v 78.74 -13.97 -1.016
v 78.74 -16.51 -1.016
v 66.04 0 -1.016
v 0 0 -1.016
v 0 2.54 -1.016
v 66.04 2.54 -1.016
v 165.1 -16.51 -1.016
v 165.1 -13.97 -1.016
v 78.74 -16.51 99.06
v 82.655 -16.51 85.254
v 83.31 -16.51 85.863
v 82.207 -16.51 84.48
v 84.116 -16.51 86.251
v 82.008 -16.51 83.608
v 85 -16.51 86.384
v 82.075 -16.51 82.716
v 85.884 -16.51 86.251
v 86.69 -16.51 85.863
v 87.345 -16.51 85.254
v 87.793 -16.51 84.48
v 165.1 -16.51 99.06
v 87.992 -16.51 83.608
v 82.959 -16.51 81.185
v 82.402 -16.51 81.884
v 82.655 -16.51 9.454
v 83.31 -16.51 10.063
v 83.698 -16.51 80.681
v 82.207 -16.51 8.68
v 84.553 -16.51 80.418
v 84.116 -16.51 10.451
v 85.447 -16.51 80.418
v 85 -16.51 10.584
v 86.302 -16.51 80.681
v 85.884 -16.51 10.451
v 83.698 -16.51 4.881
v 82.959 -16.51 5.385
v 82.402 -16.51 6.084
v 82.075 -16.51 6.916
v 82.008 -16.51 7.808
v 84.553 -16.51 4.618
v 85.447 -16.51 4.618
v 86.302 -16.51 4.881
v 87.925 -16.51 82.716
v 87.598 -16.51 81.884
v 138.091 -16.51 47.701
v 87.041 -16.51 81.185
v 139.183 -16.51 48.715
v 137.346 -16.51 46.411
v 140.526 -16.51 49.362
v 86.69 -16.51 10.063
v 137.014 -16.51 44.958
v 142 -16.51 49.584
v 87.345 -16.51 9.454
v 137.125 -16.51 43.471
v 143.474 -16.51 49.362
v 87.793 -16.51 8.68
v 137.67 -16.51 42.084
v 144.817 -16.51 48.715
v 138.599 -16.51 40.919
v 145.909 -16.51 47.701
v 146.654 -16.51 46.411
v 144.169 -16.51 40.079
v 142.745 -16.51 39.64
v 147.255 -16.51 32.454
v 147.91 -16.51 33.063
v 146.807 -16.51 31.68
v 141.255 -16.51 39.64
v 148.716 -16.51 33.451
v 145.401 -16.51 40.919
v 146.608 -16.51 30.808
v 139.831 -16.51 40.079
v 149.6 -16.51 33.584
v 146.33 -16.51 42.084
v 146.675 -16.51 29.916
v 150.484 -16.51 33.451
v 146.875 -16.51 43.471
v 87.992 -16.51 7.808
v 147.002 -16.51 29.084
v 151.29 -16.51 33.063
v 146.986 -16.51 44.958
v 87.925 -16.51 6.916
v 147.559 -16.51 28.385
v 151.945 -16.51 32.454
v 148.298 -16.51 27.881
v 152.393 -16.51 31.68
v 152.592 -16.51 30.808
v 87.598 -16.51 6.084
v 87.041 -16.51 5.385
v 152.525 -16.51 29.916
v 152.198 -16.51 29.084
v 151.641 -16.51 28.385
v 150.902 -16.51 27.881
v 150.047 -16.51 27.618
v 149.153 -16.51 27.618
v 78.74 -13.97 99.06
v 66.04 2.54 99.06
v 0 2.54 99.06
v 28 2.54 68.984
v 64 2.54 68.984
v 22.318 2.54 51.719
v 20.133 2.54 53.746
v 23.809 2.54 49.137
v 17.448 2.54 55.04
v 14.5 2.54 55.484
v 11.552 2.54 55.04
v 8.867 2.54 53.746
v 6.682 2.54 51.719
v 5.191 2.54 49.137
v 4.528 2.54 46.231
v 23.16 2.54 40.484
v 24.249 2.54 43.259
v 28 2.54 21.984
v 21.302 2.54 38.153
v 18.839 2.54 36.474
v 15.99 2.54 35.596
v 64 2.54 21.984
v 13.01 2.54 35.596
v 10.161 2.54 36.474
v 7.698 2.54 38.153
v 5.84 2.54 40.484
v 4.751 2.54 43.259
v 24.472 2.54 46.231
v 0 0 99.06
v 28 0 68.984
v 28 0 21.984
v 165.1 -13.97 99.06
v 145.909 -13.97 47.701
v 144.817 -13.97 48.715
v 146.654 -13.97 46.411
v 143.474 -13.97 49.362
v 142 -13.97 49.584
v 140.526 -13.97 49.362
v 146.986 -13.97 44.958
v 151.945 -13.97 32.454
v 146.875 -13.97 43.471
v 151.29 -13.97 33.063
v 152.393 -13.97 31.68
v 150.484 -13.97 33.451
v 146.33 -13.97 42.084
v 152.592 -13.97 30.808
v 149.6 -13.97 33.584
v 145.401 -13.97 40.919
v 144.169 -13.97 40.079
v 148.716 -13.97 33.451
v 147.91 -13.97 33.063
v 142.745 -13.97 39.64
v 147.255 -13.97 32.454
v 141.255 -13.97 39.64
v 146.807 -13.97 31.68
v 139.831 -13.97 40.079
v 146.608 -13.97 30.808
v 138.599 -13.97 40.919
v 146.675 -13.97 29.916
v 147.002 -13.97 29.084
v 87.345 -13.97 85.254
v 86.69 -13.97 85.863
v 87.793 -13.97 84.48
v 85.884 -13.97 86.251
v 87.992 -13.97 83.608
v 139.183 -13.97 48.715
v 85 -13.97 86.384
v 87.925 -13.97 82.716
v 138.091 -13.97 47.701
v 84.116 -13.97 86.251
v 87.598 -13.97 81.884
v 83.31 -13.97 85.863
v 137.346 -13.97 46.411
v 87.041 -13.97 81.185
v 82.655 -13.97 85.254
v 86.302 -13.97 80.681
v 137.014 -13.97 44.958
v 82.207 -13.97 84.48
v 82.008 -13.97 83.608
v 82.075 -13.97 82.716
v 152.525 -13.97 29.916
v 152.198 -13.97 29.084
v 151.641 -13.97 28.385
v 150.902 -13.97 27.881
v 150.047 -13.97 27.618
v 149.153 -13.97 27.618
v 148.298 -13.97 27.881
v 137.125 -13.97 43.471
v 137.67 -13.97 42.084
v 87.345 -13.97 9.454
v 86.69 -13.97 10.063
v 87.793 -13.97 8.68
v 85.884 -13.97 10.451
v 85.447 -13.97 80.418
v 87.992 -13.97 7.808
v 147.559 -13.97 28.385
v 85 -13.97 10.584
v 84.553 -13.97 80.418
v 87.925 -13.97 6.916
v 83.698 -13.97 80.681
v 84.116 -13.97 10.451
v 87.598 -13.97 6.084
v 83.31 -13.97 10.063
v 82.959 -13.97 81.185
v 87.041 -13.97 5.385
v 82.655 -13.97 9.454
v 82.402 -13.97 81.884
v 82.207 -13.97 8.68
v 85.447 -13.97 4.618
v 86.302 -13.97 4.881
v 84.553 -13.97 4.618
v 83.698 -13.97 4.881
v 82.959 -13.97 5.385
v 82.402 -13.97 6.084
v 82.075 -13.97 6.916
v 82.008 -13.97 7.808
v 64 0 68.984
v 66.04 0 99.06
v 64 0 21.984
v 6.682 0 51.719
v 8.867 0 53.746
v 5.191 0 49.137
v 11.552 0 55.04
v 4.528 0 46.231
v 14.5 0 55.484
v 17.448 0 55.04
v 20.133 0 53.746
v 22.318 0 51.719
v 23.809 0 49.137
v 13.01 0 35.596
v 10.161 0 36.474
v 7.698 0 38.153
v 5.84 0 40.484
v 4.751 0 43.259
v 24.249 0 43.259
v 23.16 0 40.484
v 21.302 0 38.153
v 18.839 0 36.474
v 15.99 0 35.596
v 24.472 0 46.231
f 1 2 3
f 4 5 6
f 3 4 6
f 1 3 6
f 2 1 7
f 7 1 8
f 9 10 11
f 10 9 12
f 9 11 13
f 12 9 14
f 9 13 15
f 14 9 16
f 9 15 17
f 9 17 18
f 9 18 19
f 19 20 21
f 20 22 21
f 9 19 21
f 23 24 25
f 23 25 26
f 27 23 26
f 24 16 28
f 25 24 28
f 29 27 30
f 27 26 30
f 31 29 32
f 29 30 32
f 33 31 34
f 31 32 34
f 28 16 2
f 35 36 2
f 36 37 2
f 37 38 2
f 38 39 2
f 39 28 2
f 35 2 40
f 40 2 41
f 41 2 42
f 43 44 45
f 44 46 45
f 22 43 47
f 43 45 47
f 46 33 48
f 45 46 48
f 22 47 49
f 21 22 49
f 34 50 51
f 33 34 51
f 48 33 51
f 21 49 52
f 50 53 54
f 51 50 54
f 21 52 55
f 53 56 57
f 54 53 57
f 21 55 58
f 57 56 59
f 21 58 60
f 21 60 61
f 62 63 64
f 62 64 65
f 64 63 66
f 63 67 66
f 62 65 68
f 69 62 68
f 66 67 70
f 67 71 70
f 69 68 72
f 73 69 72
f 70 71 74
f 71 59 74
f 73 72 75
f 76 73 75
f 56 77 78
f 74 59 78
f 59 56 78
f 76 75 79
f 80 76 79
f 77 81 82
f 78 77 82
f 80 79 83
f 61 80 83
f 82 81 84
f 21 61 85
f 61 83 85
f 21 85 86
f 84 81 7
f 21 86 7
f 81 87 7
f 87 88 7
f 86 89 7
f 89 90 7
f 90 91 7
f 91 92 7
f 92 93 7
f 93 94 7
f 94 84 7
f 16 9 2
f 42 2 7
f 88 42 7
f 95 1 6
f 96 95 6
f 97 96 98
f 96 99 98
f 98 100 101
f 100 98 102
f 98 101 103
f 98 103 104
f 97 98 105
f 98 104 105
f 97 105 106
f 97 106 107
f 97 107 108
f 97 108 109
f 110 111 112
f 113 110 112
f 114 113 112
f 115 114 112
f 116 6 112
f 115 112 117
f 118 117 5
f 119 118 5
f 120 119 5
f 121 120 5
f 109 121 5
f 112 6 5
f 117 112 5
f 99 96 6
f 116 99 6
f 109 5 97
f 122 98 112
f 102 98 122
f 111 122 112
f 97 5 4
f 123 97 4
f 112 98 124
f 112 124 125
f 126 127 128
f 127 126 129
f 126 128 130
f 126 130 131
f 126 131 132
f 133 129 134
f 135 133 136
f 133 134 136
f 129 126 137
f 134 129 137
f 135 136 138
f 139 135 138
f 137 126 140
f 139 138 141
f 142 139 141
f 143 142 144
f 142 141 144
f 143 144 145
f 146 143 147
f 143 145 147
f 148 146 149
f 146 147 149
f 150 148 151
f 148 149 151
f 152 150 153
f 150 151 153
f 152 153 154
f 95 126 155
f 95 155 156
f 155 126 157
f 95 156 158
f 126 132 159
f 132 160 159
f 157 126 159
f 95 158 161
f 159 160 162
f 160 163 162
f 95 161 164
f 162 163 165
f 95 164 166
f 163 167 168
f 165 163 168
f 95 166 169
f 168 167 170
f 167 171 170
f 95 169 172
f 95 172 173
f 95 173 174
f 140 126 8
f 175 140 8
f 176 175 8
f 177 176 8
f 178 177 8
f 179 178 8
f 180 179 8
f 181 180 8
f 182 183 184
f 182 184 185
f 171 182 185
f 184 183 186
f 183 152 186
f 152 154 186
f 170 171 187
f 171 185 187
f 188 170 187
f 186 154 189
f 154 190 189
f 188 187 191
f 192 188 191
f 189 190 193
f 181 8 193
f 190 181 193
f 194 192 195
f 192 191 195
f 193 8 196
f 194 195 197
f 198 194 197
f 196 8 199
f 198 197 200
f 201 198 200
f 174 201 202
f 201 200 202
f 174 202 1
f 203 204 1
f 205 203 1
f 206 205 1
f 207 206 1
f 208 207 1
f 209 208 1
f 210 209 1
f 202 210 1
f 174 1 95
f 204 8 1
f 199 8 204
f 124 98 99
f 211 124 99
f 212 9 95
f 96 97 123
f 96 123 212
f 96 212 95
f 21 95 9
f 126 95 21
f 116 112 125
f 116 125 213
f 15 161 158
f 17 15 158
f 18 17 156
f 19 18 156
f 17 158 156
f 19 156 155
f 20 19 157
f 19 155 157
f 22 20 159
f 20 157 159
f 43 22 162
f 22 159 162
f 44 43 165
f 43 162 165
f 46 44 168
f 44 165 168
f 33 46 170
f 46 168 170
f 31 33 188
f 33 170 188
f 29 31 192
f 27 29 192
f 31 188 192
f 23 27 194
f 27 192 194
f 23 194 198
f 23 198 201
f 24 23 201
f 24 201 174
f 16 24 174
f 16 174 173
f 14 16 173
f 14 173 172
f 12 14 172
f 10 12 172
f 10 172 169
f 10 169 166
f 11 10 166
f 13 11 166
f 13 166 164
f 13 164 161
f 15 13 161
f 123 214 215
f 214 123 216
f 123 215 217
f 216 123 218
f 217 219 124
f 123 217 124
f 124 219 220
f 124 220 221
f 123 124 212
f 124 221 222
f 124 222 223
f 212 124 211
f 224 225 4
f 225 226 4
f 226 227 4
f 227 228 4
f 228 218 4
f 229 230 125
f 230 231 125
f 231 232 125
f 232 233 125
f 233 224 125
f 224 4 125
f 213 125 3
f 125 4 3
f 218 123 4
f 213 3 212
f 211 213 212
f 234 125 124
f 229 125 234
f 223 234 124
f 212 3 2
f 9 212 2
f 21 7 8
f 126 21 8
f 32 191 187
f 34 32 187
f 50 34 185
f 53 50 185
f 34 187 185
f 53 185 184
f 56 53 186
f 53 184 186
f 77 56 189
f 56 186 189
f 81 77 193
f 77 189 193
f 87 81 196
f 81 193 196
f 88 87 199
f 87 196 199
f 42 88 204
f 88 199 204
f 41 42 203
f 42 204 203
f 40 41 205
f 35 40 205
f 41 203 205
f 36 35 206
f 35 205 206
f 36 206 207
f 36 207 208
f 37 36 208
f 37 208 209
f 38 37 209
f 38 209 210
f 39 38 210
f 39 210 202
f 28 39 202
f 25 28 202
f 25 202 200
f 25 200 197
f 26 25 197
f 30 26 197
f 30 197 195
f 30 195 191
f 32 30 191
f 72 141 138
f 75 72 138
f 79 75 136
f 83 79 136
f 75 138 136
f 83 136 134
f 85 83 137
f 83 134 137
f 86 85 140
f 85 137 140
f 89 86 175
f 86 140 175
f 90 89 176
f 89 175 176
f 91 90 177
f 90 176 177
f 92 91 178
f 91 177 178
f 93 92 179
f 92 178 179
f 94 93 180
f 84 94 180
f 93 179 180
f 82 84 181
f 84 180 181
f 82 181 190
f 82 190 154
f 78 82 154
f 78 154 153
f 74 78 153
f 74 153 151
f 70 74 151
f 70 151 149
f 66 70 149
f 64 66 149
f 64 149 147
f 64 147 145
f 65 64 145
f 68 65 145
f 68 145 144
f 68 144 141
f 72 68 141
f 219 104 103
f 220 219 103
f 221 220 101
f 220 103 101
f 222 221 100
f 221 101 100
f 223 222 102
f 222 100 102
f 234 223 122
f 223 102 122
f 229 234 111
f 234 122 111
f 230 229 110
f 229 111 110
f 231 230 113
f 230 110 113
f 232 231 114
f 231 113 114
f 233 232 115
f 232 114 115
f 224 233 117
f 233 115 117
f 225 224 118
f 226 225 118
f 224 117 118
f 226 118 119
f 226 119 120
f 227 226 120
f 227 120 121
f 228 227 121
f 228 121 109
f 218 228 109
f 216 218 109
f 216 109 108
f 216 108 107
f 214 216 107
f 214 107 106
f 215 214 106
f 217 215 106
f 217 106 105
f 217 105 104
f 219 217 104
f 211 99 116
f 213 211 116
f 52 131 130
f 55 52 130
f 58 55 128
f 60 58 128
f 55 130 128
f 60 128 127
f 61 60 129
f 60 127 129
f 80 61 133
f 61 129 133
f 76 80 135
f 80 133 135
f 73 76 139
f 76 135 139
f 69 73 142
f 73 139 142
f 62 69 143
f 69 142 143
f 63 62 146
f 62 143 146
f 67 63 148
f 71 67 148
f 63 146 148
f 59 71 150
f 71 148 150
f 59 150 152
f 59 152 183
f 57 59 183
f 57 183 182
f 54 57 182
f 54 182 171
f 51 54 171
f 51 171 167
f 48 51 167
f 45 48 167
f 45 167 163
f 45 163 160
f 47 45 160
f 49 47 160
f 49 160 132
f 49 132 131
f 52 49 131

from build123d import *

# Parameters (mm, degrees)
BOSS_EXTRUDE1_DEPTH      = 99.06
BOSS_EXTRUDE1_DEPTH_BACK = 1.016
SKETCH2_R                = 3
SKETCH2_R_2              = 10
SKETCH2_R_3              = 5
SKETCH2_W                = 36
SKETCH2_H                = 47
CUT_EXTRUDE1_DEPTH       = 194.478154064


with BuildPart() as part:
    # Sketch1 → Boss-Extrude1 (new, two sides: drawn at the far end of the back side and taken through both)
    with BuildSketch(Plane.XY.offset(-BOSS_EXTRUDE1_DEPTH_BACK)):
        Polygon((165.1, -13.97), (78.74, -13.97), (66.04, 2.54), (0, 2.54), (0, 0), (66.04, 0), (78.74, -16.51), (165.1, -16.51), align=None)
    extrude(amount=BOSS_EXTRUDE1_DEPTH + BOSS_EXTRUDE1_DEPTH_BACK)

    # Sketch2 → Cut-Extrude1 (cut, through all)
    with BuildSketch(Plane(origin=(0, 2.54, 0), x_dir=(1, 0, 0), z_dir=(0, 1, 0))):
        with Locations(Location((85, -7.584, 0), (0, 0, 270))):
            Circle(SKETCH2_R)
        with Locations(Location((85, -83.384, 0), (0, 0, 270))):
            Circle(SKETCH2_R)
        with Locations(Location((149.6, -30.584, 0), (0, 0, 270))):
            Circle(SKETCH2_R)
        with Locations(Location((14.5, -45.484, 0), (0, 0, 270))):
            Circle(SKETCH2_R_2)
        with Locations(Location((142, -44.584, 0), (0, 0, 270))):
            Circle(SKETCH2_R_3)
        with Locations((46, -45.484)):
            Rectangle(SKETCH2_W, SKETCH2_H)
    extrude(amount=-CUT_EXTRUDE1_DEPTH, mode=Mode.SUBTRACT)


solid = part.part
